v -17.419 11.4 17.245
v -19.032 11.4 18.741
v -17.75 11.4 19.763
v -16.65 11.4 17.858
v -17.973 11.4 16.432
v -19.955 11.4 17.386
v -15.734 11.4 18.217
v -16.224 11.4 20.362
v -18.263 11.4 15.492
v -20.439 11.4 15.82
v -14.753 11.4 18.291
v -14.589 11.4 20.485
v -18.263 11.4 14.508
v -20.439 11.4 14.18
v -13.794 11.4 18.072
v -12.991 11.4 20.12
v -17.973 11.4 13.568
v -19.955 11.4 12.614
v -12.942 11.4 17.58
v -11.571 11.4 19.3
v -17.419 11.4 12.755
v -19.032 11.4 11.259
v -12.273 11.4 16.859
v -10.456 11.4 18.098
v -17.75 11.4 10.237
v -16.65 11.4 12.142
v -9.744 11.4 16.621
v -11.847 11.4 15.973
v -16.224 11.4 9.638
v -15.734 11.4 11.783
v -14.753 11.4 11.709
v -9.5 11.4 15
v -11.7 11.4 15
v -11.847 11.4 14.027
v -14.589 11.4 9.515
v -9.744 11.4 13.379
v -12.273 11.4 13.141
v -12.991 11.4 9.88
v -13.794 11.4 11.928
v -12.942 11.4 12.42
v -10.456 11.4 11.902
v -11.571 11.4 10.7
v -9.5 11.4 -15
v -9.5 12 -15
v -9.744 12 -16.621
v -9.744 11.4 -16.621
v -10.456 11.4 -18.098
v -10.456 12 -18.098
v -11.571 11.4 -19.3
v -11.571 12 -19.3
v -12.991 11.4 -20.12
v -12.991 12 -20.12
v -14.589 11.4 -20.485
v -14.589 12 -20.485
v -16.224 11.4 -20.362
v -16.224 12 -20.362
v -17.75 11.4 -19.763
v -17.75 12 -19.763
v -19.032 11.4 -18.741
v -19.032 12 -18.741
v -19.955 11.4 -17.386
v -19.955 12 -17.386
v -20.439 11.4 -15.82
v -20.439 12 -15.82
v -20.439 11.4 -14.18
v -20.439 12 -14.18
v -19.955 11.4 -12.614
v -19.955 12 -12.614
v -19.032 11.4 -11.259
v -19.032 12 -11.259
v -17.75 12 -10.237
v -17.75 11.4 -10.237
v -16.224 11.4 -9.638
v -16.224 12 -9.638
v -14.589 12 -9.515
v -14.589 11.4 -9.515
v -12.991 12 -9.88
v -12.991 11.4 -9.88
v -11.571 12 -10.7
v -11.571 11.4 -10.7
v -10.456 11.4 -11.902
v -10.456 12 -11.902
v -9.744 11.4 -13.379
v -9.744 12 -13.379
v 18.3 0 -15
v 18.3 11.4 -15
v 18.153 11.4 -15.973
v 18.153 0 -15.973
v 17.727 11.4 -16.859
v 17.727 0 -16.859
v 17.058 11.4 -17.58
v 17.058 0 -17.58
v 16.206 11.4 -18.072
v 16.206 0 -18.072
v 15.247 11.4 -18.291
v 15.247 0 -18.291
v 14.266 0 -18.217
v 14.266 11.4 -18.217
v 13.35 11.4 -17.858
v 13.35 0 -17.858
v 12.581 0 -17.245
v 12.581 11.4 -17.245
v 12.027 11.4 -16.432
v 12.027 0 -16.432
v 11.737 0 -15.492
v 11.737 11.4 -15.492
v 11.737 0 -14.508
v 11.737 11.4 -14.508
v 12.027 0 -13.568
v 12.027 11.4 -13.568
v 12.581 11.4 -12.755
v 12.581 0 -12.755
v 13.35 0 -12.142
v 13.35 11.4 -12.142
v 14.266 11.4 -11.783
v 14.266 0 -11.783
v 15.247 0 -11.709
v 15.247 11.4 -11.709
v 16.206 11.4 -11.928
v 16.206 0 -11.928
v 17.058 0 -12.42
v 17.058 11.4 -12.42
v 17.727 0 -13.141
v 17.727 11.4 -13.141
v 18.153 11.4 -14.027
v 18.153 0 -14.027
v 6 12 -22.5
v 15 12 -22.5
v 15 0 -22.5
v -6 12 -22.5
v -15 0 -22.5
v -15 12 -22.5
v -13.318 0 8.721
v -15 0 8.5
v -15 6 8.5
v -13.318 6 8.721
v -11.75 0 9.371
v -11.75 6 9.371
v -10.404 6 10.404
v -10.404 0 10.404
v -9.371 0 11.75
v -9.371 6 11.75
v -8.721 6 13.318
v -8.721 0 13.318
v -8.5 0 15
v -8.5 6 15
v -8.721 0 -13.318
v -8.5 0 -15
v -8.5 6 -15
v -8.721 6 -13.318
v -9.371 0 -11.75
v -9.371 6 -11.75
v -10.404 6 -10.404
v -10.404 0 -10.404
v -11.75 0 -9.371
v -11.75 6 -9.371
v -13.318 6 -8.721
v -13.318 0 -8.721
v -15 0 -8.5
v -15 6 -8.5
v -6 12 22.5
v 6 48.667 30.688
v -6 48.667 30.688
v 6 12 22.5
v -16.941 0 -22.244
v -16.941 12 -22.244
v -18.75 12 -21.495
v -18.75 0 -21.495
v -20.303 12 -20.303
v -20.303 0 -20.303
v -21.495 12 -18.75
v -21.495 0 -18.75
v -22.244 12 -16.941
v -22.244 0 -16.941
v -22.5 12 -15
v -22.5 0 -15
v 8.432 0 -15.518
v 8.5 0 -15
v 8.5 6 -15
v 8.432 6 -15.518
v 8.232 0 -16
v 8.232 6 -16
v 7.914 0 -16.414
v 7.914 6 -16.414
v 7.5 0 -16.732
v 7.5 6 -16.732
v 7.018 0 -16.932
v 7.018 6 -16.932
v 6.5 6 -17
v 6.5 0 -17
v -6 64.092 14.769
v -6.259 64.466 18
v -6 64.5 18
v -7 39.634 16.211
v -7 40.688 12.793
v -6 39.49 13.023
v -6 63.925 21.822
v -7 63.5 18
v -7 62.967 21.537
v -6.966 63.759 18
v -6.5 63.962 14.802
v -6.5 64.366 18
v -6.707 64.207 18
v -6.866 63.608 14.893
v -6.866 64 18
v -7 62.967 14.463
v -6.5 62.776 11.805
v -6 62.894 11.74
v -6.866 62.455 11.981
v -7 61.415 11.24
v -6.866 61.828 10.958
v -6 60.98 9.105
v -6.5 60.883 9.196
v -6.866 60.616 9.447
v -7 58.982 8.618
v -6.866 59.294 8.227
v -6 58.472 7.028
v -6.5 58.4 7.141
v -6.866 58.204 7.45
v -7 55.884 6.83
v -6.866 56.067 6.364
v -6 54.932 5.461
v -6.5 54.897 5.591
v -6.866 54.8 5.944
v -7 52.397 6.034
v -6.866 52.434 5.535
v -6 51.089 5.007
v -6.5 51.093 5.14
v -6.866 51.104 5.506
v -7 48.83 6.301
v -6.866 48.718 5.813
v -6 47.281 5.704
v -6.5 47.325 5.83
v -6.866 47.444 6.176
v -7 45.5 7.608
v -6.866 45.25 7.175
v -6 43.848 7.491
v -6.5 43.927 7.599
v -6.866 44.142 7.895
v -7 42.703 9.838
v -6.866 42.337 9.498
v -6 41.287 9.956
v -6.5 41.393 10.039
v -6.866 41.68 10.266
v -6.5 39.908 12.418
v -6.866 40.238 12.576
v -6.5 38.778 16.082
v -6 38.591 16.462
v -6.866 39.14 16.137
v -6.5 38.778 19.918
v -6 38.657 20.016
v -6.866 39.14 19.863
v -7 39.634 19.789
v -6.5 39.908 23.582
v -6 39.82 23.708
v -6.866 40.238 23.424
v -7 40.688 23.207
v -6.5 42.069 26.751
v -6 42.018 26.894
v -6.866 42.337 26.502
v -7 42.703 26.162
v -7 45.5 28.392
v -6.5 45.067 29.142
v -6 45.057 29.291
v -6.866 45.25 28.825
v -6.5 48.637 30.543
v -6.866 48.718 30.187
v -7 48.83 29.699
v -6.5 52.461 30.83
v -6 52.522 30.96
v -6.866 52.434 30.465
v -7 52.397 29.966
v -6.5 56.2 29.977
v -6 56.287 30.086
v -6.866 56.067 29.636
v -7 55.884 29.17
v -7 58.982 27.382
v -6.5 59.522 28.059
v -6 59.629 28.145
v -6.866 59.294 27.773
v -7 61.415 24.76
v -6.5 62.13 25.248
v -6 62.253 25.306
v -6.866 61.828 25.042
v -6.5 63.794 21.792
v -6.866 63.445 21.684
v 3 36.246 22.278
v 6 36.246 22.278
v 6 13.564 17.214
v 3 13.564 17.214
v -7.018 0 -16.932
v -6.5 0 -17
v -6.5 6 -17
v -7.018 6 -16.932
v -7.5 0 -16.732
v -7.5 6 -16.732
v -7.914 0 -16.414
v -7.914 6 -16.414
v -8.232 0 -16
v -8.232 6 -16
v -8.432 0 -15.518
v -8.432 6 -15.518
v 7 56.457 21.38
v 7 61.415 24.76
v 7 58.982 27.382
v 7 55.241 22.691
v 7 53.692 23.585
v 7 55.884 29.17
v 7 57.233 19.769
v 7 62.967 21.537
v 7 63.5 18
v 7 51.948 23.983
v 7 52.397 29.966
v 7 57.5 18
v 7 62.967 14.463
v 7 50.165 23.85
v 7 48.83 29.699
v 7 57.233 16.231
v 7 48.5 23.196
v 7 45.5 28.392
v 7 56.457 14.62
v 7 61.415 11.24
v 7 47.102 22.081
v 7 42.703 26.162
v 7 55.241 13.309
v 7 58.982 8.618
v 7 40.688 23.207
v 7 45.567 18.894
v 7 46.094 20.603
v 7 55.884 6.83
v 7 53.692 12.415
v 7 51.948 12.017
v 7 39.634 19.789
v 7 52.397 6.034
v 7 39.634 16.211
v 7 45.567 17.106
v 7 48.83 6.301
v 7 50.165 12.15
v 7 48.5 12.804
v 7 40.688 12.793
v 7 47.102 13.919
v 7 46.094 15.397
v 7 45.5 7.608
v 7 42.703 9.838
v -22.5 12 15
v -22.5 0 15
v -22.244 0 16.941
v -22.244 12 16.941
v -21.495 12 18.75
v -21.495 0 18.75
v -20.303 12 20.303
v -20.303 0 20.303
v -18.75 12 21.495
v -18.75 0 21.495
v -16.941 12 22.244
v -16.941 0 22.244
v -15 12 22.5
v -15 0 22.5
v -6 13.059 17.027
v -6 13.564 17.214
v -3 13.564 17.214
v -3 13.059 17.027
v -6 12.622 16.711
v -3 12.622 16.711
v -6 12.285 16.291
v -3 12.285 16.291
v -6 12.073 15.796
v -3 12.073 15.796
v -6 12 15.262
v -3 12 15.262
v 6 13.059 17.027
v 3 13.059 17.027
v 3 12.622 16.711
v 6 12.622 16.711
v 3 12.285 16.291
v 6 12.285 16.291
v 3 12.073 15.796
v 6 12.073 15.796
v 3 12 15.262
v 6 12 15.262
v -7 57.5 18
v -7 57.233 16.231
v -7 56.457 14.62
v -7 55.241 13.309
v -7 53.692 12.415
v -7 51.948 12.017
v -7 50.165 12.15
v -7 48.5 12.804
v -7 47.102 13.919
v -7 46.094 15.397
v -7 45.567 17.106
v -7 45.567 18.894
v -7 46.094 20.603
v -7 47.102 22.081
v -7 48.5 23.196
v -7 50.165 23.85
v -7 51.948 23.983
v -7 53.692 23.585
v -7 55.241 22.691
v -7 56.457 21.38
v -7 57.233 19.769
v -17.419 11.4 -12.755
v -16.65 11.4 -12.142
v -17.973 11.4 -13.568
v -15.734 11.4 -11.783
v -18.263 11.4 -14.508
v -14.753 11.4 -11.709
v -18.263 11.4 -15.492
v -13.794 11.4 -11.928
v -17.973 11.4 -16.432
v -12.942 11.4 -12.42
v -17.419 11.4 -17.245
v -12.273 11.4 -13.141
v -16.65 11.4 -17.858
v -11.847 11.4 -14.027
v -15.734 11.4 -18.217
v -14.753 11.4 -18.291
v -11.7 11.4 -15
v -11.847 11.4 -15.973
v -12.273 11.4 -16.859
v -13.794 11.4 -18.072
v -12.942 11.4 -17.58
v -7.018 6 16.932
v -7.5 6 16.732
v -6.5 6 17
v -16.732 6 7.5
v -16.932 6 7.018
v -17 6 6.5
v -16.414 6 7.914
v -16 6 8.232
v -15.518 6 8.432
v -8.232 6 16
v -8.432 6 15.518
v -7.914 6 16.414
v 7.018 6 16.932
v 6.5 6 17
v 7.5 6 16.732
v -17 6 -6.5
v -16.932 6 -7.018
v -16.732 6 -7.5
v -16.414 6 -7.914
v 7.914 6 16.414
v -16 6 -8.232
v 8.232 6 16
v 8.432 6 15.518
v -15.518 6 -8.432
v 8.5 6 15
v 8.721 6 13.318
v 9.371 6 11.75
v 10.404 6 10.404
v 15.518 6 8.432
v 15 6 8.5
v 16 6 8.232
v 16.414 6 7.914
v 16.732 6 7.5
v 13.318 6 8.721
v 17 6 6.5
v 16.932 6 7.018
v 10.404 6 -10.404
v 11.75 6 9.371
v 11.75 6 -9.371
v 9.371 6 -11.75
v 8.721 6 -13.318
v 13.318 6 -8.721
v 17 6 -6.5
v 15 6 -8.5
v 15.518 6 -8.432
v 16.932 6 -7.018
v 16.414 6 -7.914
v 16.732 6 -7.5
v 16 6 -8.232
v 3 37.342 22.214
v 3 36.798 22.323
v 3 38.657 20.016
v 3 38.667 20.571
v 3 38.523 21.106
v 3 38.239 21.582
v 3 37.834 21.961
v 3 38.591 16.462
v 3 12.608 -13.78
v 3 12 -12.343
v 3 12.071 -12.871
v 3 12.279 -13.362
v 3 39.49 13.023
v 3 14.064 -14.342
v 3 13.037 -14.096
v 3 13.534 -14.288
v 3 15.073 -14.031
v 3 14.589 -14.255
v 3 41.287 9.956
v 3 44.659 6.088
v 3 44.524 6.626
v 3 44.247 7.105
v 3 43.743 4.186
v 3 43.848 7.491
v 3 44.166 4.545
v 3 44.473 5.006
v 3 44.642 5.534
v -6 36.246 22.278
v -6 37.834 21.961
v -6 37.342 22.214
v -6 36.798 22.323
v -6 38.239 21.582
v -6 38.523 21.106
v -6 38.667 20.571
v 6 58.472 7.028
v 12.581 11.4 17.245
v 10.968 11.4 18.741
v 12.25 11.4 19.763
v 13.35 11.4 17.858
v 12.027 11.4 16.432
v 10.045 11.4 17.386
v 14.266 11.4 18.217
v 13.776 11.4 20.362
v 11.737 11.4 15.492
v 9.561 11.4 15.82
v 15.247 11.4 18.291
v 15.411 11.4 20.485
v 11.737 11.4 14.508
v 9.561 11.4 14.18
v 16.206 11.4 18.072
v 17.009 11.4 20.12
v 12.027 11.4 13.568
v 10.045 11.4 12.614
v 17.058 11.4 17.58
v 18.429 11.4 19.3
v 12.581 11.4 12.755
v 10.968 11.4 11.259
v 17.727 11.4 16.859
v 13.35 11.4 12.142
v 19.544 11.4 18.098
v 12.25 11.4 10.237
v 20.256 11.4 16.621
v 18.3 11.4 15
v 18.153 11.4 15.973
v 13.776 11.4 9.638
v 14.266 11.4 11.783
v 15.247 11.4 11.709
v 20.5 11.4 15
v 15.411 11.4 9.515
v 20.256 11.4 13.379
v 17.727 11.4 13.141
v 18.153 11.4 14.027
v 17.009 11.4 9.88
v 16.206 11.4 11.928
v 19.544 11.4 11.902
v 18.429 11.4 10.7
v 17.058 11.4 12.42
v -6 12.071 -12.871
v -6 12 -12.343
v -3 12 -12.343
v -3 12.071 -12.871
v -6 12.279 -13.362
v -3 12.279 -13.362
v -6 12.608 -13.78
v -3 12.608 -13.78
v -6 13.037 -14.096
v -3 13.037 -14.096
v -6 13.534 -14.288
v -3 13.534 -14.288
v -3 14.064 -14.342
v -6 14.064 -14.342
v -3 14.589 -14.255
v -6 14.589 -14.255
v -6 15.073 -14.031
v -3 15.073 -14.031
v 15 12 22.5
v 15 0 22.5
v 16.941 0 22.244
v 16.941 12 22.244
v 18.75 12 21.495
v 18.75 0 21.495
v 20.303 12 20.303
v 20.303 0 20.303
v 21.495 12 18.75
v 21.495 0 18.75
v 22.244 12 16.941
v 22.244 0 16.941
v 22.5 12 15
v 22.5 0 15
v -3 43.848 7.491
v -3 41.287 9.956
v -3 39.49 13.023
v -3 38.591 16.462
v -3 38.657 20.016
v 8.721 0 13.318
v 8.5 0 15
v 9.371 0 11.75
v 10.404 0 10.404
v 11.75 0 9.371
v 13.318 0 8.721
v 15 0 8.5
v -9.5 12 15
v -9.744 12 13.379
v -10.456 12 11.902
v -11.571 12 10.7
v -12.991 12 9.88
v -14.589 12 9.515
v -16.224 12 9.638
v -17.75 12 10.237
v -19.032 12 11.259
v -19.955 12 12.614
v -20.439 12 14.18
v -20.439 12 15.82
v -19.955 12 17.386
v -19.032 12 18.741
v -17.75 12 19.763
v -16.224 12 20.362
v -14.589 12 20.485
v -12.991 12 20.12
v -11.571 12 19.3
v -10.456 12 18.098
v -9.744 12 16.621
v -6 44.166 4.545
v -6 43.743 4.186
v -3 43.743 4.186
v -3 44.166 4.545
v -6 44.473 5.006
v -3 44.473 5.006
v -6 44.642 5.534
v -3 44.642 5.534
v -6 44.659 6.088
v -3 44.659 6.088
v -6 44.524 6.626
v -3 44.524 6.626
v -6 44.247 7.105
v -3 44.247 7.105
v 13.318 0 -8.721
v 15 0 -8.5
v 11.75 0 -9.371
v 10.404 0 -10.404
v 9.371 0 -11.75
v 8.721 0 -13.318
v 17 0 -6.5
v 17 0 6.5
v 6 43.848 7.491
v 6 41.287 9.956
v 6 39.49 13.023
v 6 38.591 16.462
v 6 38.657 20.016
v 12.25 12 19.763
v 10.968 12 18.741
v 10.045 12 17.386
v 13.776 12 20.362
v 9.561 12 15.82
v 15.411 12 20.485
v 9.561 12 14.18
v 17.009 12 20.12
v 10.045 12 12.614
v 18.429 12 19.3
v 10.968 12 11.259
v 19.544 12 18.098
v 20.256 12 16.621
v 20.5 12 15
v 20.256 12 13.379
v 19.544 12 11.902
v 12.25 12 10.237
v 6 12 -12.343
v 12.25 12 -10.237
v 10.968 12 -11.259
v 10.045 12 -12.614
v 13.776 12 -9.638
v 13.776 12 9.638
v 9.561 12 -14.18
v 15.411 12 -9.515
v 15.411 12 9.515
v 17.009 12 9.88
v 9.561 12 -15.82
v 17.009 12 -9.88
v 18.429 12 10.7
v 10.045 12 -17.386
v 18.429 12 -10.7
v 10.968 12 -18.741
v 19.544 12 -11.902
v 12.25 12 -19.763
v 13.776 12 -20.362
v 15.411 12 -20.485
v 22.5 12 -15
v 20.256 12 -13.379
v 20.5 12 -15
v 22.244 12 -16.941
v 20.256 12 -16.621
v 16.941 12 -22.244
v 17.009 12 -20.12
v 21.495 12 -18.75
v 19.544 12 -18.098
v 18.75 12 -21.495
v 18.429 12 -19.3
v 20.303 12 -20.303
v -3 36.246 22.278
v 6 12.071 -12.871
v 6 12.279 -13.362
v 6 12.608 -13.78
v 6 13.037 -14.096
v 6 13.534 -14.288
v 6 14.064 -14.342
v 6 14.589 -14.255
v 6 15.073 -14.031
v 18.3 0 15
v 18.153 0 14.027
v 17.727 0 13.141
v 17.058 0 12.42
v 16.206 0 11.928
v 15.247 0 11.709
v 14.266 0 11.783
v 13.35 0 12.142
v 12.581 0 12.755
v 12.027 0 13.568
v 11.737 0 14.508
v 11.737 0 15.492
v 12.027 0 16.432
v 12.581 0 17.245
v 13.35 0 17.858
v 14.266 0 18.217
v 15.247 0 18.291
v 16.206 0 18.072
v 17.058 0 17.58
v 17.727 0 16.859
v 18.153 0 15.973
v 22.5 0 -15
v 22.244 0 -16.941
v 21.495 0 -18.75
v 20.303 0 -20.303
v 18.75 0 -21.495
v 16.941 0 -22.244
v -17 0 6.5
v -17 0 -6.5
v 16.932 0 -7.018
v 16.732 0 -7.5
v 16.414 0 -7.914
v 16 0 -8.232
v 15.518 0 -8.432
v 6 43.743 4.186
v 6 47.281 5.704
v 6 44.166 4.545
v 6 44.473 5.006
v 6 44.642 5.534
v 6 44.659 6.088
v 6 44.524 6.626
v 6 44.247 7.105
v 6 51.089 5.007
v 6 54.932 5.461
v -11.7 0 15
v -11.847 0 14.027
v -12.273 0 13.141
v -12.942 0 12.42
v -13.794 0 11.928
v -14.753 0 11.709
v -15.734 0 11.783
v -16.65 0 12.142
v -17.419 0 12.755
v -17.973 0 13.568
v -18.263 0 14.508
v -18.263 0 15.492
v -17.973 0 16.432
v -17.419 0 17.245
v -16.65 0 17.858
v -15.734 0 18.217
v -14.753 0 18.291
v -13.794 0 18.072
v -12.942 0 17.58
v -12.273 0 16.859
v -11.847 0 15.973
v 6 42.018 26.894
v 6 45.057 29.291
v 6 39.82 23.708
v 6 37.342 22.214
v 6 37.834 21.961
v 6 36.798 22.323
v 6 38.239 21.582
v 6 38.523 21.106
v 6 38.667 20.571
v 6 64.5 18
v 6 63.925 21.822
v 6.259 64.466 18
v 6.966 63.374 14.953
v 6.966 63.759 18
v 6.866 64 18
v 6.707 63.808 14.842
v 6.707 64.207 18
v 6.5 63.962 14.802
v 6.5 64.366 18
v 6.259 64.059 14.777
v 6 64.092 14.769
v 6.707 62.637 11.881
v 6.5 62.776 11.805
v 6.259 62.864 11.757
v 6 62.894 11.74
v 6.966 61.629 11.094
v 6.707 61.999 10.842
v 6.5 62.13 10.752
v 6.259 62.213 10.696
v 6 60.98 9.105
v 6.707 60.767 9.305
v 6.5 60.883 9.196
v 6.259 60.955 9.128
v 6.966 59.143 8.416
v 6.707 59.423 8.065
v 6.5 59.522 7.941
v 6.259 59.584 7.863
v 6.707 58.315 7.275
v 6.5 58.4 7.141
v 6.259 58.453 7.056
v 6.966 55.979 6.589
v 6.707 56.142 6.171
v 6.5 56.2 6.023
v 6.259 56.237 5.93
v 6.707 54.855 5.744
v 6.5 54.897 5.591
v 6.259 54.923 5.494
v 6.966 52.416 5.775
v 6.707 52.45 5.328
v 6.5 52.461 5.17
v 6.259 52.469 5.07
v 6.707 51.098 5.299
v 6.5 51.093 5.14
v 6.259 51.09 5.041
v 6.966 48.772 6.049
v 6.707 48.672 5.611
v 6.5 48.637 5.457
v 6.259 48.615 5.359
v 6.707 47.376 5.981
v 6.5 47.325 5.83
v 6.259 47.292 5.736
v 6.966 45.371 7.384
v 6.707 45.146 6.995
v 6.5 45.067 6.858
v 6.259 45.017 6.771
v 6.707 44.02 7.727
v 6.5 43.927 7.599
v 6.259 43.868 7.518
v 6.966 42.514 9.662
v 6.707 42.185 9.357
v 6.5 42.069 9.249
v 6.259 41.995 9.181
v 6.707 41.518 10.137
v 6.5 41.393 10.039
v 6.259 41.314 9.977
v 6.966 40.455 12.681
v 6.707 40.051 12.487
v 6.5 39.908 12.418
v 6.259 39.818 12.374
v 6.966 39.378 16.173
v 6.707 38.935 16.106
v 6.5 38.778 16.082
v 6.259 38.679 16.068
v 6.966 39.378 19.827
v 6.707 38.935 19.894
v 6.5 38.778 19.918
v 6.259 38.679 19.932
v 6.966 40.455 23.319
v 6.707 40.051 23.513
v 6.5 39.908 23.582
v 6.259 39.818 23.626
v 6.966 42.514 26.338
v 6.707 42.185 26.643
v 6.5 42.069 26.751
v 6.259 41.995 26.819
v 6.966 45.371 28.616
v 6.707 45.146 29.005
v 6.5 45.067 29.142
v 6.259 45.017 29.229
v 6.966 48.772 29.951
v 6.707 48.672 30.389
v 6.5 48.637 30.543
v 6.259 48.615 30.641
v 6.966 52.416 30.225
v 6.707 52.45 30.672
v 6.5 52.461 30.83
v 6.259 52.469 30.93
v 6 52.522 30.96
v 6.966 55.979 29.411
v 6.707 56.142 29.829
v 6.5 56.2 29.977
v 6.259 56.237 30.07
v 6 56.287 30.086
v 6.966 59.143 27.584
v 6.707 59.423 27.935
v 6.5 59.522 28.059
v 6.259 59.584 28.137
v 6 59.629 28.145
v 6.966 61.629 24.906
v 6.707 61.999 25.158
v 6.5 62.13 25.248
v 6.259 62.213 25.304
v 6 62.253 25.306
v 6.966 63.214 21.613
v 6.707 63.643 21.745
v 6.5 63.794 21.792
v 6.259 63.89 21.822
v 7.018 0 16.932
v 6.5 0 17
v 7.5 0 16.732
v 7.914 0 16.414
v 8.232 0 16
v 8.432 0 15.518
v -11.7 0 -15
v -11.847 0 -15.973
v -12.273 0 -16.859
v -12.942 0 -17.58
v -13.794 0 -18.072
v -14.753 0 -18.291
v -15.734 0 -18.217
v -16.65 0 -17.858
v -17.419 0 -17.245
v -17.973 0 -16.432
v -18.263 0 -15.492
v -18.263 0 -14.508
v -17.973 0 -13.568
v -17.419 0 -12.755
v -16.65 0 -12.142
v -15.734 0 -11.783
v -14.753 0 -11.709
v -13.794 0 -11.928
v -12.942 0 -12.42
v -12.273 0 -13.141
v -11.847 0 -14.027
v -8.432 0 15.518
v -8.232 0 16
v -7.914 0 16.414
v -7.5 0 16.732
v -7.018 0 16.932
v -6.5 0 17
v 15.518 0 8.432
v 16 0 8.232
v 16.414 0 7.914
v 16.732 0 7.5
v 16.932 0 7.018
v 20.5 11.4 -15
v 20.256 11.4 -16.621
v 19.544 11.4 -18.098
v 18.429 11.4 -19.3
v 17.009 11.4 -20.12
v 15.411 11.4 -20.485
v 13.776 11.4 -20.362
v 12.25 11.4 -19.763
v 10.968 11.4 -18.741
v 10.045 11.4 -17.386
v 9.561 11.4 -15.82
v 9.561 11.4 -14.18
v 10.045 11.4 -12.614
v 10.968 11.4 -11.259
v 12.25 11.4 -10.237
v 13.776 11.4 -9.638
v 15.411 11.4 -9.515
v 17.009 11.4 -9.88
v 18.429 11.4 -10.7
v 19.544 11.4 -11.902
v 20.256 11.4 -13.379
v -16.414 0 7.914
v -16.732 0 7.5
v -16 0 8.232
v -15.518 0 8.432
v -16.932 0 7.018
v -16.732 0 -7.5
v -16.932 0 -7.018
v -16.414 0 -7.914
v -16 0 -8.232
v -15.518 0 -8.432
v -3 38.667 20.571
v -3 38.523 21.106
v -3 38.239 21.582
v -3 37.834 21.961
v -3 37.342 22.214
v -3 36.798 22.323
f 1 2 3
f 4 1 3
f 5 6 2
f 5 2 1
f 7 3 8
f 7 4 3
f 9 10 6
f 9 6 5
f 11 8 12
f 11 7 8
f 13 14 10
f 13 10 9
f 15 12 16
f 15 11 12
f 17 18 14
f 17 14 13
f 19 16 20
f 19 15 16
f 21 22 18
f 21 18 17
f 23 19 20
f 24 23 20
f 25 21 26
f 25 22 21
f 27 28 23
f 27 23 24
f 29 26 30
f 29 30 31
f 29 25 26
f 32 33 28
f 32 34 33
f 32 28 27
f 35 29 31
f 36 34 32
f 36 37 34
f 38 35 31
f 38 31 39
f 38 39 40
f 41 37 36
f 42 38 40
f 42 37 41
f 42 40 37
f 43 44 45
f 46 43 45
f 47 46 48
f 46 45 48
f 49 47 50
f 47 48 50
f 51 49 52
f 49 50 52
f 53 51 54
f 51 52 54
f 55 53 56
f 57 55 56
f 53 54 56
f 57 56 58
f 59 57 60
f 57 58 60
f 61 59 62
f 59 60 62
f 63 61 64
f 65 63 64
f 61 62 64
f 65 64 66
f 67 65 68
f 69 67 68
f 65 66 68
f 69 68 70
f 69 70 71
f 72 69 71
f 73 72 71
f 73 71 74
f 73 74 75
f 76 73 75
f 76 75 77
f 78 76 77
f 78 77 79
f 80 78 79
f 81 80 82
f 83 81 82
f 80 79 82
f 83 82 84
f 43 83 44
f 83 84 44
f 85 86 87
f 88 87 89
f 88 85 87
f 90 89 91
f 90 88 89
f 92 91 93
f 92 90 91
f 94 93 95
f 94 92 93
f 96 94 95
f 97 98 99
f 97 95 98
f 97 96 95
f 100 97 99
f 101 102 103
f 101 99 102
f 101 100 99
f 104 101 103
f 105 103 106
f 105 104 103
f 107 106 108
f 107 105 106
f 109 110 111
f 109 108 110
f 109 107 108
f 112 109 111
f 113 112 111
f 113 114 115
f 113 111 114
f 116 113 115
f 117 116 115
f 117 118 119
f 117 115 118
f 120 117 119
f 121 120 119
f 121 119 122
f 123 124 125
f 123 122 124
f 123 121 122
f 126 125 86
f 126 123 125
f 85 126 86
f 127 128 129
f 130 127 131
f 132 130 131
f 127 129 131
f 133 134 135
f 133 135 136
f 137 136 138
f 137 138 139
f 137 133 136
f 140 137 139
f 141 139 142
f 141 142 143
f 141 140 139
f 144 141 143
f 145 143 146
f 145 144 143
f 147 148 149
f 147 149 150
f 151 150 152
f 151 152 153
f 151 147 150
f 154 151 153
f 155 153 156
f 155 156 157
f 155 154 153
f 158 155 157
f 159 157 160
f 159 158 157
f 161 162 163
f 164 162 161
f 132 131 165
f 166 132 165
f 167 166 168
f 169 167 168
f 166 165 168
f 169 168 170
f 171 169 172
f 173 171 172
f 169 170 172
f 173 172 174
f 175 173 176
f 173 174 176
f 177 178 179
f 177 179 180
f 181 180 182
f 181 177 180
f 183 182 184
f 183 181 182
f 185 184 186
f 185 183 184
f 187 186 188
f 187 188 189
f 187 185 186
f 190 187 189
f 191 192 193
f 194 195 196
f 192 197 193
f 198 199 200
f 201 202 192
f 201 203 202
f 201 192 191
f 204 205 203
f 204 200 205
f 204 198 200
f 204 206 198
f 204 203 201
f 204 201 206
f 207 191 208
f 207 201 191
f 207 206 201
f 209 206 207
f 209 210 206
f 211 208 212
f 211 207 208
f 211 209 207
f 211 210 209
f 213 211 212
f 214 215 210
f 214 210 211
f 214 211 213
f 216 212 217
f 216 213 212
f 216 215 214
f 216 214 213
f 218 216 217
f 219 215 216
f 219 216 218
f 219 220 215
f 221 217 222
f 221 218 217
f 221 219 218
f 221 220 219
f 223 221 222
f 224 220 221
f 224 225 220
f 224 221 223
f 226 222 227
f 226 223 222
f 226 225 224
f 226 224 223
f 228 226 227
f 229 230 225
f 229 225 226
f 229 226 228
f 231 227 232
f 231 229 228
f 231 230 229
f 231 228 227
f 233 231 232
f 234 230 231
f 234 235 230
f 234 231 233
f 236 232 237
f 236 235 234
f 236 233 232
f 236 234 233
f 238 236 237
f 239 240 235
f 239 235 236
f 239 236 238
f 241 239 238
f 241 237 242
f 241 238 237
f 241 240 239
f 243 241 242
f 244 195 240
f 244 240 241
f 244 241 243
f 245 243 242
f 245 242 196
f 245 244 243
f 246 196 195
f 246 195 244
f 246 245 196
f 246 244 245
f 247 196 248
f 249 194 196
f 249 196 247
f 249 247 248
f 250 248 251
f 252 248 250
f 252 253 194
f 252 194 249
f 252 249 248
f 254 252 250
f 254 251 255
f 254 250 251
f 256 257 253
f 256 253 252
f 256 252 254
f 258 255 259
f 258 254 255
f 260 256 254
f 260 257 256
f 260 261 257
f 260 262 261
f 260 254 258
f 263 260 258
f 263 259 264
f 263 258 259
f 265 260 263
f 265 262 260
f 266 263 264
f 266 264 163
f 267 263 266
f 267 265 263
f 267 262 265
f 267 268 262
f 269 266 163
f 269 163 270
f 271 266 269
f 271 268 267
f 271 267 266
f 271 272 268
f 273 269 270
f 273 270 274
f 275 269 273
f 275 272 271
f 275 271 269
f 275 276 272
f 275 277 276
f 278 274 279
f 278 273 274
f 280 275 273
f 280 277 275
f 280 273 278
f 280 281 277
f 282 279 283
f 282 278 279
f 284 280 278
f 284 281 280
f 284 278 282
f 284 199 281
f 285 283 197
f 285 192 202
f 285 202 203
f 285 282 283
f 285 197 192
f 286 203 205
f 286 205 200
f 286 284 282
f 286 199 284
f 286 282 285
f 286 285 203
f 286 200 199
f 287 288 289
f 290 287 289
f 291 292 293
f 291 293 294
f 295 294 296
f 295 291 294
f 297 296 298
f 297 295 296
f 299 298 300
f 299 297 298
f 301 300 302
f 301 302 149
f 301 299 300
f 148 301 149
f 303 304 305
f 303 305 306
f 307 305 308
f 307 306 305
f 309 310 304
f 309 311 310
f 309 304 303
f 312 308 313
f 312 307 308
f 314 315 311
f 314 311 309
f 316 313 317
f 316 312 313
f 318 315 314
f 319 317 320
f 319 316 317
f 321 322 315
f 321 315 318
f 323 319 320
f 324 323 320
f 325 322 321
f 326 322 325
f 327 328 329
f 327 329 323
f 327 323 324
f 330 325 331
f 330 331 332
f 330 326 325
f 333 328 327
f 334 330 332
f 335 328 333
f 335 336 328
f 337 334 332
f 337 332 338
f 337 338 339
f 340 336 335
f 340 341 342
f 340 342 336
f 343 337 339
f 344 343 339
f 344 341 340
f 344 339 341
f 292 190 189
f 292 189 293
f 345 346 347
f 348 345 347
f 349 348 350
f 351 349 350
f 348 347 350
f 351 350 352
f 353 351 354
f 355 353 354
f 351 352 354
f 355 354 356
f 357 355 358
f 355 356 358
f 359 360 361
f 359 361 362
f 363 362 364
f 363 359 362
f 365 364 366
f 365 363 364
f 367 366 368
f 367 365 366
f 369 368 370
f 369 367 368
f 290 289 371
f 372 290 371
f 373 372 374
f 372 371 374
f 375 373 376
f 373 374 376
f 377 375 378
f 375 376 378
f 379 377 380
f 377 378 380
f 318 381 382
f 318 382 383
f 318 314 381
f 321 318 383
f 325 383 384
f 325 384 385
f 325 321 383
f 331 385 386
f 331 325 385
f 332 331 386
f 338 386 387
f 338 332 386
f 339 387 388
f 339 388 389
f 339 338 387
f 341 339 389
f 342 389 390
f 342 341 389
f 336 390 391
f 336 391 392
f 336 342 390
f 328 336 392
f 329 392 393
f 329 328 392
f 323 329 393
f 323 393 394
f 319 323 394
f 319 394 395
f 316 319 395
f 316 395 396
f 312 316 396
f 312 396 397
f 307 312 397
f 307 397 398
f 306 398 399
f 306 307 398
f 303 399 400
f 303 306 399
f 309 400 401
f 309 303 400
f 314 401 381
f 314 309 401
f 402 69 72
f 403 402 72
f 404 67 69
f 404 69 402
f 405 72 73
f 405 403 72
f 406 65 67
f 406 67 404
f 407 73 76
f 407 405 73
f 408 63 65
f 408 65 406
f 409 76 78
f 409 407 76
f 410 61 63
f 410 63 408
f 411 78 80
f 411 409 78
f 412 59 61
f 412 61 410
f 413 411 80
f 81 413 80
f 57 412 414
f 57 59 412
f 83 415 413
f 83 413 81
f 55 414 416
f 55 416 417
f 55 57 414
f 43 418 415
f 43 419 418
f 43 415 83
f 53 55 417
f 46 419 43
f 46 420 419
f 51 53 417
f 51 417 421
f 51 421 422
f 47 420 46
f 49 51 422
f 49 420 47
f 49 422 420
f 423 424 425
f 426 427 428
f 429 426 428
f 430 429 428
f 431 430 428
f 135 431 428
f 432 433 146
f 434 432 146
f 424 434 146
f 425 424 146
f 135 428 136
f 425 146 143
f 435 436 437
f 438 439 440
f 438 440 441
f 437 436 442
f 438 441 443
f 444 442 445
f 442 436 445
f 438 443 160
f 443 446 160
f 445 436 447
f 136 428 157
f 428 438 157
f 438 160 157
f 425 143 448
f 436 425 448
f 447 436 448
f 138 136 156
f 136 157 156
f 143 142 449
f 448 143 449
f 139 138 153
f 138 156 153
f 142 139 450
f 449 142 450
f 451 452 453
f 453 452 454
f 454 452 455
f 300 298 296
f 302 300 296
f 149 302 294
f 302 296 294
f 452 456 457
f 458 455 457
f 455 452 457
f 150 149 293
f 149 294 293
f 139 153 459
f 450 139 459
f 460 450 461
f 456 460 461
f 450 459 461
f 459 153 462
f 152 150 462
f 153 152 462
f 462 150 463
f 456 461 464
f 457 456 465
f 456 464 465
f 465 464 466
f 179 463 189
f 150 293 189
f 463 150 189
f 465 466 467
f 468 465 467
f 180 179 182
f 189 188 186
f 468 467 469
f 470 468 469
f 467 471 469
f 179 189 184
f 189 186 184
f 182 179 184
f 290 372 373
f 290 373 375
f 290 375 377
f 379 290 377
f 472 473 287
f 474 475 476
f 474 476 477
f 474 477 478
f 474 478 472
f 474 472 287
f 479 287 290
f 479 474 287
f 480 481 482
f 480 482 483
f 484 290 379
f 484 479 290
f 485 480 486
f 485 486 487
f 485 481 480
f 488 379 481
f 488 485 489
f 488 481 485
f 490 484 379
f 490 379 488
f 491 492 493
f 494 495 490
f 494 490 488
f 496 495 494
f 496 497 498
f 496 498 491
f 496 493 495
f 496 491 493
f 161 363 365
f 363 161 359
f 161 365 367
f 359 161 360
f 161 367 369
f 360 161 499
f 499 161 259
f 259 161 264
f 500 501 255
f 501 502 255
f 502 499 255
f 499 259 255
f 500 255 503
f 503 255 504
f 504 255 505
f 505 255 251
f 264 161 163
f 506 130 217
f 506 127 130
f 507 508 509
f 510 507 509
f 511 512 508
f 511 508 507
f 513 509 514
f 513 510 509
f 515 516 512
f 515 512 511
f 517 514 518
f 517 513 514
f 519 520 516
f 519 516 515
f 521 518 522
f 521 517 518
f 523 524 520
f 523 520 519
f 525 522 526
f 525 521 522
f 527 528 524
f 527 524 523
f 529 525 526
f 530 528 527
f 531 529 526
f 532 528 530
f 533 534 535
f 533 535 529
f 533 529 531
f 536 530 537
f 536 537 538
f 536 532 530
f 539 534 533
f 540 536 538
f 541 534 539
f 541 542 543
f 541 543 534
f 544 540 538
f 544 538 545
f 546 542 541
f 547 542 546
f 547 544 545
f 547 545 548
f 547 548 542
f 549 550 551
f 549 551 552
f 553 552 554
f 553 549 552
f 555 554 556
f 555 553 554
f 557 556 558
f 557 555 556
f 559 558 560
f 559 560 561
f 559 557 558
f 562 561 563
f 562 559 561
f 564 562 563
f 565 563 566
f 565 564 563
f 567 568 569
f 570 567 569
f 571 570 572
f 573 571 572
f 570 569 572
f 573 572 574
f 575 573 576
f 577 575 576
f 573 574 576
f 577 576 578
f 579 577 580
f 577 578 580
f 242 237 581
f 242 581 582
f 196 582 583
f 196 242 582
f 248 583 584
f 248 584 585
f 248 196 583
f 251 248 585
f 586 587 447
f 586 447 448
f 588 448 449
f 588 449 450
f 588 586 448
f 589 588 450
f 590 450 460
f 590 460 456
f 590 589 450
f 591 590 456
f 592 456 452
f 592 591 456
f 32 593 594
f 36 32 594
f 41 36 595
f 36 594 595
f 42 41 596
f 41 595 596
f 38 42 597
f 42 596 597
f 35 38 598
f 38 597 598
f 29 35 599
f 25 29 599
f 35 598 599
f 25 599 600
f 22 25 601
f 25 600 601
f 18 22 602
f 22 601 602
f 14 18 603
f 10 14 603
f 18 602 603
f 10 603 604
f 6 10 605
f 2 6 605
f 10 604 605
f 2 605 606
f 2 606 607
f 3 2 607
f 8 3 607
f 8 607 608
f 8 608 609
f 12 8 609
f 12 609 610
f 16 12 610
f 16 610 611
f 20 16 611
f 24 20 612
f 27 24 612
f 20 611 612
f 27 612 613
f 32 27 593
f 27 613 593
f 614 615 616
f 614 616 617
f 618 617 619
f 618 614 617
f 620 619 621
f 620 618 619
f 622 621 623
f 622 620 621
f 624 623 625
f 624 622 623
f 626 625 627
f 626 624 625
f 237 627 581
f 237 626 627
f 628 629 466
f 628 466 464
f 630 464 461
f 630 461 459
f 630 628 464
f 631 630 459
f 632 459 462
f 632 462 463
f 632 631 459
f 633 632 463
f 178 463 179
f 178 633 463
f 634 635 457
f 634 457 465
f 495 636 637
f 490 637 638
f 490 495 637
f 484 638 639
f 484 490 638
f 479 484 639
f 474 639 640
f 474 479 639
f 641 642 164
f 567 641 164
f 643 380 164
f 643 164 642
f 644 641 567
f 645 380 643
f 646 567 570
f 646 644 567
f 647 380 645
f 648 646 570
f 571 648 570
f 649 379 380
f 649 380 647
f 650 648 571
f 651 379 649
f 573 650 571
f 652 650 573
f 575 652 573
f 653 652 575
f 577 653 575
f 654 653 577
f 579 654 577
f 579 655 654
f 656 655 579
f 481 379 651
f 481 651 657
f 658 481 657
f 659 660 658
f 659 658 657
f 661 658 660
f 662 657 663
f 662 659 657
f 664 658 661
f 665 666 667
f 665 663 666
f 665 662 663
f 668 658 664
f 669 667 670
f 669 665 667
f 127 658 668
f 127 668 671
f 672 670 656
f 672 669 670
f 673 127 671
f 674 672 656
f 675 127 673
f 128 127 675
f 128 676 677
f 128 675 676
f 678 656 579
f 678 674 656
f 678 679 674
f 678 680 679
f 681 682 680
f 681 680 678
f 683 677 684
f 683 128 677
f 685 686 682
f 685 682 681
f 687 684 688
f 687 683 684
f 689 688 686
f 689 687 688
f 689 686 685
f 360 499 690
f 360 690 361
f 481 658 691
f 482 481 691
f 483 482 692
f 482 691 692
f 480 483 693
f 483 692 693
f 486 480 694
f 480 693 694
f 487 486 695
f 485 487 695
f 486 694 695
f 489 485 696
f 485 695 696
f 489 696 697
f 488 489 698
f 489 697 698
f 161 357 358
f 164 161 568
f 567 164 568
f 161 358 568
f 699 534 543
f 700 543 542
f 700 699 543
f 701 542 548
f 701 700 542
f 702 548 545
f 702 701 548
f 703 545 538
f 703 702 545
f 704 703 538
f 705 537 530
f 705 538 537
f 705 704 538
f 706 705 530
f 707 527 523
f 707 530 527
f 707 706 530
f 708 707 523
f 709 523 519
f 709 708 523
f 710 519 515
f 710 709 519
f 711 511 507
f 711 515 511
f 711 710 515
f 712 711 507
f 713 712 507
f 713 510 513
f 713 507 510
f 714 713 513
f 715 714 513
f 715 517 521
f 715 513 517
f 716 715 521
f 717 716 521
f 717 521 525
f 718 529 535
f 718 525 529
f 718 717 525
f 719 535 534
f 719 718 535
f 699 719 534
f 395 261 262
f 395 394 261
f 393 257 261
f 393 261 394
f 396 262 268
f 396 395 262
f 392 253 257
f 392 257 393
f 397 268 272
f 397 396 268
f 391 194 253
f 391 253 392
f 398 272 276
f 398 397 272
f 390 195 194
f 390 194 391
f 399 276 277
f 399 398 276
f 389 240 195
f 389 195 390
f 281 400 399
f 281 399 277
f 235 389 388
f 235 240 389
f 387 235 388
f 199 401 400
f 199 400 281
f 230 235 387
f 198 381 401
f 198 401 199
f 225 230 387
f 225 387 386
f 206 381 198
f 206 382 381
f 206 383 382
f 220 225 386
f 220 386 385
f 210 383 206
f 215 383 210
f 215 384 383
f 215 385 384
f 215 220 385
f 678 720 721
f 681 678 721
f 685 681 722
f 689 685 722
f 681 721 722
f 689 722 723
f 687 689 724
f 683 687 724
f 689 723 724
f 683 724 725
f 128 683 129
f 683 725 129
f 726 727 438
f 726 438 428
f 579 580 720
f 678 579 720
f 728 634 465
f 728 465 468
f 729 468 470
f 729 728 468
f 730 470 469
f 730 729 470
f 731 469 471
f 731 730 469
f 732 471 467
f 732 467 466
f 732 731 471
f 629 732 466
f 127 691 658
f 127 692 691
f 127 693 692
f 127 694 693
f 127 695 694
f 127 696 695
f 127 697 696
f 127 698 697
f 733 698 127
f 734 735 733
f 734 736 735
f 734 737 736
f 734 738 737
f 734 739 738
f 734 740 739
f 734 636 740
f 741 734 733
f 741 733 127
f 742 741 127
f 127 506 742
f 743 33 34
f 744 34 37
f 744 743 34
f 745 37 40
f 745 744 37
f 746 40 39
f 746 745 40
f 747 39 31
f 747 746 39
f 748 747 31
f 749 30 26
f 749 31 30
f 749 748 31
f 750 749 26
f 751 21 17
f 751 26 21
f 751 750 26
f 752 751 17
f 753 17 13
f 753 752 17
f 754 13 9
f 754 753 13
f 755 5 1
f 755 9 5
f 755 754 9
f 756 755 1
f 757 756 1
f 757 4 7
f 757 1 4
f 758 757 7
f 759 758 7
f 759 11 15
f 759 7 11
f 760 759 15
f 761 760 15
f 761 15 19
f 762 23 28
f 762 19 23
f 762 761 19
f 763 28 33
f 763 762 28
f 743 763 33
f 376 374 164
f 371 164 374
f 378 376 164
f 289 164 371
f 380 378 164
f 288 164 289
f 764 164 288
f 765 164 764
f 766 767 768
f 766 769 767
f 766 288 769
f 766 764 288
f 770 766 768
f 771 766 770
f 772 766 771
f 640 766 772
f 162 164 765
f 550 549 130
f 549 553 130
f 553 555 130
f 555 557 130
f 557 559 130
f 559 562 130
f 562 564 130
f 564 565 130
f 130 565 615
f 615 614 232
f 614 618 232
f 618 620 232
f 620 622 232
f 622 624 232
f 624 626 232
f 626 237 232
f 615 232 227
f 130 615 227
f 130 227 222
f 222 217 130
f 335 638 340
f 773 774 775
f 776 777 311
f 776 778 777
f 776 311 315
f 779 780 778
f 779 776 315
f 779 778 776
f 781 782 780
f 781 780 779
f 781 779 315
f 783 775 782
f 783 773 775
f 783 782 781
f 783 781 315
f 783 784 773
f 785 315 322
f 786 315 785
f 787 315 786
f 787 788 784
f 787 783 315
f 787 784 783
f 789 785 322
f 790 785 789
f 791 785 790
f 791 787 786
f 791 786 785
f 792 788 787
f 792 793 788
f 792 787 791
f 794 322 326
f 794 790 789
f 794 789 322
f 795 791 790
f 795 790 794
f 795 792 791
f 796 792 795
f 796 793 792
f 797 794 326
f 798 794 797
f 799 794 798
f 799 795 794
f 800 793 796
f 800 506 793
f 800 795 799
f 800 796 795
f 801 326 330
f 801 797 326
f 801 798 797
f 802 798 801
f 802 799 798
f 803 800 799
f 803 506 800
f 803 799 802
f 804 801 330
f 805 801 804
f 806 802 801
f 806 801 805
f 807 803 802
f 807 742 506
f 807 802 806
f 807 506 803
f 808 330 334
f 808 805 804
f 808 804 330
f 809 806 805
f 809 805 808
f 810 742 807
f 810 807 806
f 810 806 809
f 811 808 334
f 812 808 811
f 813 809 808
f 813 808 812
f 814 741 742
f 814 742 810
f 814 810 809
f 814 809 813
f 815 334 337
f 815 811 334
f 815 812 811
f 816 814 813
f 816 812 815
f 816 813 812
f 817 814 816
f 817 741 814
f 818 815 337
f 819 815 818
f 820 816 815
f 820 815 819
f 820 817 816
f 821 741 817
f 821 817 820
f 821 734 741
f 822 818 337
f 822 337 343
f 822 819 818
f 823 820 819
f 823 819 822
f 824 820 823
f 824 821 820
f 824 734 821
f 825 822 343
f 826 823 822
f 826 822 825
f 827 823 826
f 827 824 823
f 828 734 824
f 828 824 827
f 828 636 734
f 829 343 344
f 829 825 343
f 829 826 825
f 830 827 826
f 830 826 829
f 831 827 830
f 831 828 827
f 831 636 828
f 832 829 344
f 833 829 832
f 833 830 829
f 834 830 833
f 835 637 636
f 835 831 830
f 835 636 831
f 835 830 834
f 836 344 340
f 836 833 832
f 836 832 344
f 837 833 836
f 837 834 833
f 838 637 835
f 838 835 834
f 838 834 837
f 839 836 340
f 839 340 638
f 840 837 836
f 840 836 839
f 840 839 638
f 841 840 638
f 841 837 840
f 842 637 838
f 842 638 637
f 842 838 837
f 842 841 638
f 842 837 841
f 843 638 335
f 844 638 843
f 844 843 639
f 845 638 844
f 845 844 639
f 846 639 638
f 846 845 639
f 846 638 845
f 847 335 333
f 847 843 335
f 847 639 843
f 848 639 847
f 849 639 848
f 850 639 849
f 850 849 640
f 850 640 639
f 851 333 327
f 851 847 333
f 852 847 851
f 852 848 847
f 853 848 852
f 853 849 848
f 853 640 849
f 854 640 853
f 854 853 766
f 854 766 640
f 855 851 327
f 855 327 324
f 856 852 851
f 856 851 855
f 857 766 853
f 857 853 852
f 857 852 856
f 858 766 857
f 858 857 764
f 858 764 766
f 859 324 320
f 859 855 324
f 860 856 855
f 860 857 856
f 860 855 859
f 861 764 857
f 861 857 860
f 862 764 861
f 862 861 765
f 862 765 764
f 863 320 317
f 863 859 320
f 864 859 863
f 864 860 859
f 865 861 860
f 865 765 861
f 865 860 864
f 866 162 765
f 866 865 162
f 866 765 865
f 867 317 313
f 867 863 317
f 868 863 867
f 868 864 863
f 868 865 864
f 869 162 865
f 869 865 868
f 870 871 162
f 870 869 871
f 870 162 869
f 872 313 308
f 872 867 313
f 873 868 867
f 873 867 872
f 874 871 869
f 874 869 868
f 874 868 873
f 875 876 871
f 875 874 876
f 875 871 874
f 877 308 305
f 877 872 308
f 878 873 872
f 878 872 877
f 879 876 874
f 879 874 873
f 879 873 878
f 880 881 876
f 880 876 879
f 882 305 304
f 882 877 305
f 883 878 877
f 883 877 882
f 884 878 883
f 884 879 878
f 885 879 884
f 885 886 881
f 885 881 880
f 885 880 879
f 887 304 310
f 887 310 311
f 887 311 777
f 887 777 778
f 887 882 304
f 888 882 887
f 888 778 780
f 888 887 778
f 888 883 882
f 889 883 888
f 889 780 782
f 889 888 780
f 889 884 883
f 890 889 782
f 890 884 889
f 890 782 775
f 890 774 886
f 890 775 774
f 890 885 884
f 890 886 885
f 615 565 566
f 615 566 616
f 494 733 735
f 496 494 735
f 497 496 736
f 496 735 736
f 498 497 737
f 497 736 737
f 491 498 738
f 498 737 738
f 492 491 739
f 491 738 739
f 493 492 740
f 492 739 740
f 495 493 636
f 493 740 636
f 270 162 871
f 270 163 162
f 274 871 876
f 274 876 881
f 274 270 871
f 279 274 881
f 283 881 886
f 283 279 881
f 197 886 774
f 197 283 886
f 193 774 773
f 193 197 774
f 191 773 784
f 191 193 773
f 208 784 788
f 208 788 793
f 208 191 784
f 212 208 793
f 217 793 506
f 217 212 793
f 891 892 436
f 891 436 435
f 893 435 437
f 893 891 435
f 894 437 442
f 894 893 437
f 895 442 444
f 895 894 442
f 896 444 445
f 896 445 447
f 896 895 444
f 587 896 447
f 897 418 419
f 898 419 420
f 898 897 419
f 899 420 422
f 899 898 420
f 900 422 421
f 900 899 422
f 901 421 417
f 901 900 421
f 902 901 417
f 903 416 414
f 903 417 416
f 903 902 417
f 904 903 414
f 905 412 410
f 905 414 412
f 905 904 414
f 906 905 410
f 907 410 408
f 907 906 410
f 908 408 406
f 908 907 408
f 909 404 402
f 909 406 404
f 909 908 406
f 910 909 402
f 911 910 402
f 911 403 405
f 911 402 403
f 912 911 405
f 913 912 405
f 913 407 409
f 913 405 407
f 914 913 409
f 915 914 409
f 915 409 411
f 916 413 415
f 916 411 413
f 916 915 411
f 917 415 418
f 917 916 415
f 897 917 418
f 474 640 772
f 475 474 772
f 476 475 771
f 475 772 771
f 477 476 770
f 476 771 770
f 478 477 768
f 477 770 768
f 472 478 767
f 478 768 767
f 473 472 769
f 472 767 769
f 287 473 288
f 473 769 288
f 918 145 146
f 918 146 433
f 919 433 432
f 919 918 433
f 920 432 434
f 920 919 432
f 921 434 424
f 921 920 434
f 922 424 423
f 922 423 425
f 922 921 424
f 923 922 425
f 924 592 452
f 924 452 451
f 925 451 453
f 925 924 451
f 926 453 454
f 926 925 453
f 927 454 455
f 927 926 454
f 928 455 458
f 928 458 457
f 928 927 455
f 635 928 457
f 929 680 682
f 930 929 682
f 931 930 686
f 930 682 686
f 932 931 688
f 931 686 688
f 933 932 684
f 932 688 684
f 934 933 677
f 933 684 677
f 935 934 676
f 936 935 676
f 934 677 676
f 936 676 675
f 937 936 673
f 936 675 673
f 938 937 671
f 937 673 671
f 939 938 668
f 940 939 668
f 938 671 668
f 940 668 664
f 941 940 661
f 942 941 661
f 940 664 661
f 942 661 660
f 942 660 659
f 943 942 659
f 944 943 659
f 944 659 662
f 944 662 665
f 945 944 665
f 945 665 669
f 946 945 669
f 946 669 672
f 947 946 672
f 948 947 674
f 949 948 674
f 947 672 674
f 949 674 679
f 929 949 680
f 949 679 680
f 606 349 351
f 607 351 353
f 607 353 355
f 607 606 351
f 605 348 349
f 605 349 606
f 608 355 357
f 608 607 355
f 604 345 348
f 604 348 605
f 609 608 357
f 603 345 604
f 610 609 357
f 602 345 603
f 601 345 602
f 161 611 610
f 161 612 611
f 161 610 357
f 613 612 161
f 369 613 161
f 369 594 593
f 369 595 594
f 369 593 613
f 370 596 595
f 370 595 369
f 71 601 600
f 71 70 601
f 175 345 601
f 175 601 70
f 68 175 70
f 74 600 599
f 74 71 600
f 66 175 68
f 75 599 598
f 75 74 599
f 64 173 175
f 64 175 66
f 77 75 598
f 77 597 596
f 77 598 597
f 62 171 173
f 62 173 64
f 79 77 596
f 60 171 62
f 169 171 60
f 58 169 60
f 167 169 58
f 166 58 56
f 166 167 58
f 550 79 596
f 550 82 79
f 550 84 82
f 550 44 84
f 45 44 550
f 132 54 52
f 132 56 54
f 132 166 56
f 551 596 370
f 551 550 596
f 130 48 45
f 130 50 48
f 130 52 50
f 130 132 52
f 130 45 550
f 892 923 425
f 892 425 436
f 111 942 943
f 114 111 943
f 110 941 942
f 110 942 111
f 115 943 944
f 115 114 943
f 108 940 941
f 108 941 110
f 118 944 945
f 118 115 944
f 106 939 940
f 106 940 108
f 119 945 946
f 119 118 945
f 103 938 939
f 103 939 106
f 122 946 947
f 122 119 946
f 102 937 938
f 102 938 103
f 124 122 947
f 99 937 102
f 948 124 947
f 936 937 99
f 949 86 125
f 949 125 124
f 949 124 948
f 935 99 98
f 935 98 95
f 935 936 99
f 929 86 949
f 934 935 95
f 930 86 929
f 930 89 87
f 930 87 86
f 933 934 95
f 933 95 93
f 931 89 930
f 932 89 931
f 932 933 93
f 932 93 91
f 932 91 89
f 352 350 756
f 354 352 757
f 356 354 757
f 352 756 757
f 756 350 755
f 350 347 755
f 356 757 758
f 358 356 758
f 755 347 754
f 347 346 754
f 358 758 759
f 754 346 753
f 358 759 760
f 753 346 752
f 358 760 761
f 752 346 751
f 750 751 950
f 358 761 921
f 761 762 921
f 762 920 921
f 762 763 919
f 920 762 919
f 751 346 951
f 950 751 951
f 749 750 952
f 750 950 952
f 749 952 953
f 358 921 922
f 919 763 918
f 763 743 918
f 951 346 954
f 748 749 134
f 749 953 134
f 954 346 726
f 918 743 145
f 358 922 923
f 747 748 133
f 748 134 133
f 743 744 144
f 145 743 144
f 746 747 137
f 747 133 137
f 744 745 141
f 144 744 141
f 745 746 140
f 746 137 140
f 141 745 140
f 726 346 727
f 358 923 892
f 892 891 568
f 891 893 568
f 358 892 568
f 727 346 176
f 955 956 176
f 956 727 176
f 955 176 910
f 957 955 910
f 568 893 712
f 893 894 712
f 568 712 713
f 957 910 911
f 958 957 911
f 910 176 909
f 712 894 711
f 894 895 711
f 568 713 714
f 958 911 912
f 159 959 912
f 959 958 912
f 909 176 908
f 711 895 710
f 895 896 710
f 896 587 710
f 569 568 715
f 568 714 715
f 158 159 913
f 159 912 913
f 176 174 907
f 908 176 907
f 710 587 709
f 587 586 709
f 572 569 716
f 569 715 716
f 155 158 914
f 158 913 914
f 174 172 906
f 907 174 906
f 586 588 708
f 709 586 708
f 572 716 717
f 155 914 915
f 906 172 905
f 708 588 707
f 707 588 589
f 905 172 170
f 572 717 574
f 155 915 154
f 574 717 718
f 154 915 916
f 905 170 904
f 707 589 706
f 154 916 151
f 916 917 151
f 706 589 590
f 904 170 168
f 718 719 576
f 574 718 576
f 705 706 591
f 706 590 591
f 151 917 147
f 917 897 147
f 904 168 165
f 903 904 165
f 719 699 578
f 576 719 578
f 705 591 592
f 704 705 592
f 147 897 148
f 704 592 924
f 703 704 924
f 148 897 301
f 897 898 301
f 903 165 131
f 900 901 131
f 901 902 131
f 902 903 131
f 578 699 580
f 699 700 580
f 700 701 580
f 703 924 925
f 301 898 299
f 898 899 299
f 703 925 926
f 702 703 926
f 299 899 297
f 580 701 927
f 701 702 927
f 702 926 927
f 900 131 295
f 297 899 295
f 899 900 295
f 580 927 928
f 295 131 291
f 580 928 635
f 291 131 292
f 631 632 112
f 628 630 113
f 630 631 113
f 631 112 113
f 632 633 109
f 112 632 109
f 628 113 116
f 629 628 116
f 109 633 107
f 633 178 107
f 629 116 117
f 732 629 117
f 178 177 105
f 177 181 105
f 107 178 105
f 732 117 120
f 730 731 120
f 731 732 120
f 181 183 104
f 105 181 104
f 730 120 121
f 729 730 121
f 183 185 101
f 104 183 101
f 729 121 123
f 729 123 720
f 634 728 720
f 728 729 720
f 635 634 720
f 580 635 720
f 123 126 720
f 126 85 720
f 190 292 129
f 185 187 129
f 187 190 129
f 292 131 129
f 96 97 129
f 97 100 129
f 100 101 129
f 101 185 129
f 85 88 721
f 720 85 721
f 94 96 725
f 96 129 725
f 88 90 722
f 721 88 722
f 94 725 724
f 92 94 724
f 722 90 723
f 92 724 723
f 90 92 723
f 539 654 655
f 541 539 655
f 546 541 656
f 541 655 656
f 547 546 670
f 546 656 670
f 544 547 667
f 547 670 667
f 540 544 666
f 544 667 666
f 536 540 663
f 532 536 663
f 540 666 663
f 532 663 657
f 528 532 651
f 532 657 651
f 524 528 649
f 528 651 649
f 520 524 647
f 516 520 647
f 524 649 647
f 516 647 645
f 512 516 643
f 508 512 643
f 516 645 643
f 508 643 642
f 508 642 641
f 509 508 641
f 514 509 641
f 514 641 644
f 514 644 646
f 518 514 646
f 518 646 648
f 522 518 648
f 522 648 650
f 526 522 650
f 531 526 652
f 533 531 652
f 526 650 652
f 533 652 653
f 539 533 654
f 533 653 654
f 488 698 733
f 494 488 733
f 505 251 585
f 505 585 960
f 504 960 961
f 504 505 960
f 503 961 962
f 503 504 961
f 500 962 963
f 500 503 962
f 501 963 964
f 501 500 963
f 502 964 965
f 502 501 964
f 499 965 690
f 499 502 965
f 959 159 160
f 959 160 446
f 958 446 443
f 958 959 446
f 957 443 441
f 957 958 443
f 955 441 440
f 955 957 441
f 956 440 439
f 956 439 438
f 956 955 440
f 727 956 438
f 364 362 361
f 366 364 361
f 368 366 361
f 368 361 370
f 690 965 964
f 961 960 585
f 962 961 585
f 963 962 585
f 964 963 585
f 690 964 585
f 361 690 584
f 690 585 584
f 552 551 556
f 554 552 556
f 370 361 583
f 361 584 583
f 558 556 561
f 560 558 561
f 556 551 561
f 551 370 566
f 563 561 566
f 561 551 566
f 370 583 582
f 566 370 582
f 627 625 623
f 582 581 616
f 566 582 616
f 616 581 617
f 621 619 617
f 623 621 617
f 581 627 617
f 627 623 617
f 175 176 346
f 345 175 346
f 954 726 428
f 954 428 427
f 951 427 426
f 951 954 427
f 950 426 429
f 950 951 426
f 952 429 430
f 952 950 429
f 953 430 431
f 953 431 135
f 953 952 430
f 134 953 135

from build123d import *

# Parameters (mm, degrees)
SKETCH1_R                = 3.3
BOSS_EXTRUDE1_DEPTH      = 12
BOSS_EXTRUDE2_DEPTH      = 6
BOSS_EXTRUDE2_DEPTH_BACK = 6
CUT_EXTRUDE1_DEPTH       = 3
CUT_EXTRUDE2_DEPTH       = 3
CUT_EXTRUDE3_DEPTH       = 6
SKETCH7_R                = 5.5
CUT_EXTRUDE4_DEPTH       = 0.6
SKETCH8_R                = 5.5
CUT_EXTRUDE5_DEPTH       = 0.6
SKETCH9_R                = 5.5
CUT_EXTRUDE6_DEPTH       = 0.6
SKETCH10_R               = 5.5
CUT_EXTRUDE7_DEPTH       = 0.6


with BuildPart() as part:
    # Sketch1 → Boss-Extrude1 (new body)
    with BuildSketch(Plane(origin=(0, 0, 0), x_dir=(1, 0, 0), z_dir=(0, 1, 0))):
        with BuildLine():
            Line((-15, -22.5), (15, -22.5))
            ThreePointArc((15, -22.5), (20.303300859, -20.303300859), (22.5, -15))
            Line((22.5, -15), (22.5, 15))
            ThreePointArc((22.5, 15), (20.303300859, 20.303300859), (15, 22.5))
            Line((15, 22.5), (-15, 22.5))
            ThreePointArc((-15, 22.5), (-20.303300859, 20.303300859), (-22.5, 15))
            Line((-22.5, 15), (-22.5, -15))
            ThreePointArc((-22.5, -15), (-20.303300859, -20.303300859), (-15, -22.5))
        make_face()
        with Locations((15, 15)):
            Circle(SKETCH1_R, mode=Mode.SUBTRACT)
        with Locations((15, -15)):
            Circle(SKETCH1_R, mode=Mode.SUBTRACT)
        with Locations((-15, 15)):
            Circle(SKETCH1_R, mode=Mode.SUBTRACT)
        with Locations((-15, -15)):
            Circle(SKETCH1_R, mode=Mode.SUBTRACT)
    extrude(amount=BOSS_EXTRUDE1_DEPTH)

    # Sketch2 → Boss-Extrude2 (add, two sides)
    with BuildSketch(Plane(origin=(0, 0, 0), x_dir=(0, 0, -1), z_dir=(1, 0, 0))) as boss_extrude2_sk:
        with BuildLine():
            Line((-30.687542875, 48.666935264), (-22.5, 12))
            Line((-22.5, 12), (22.5, 12))
            Line((22.5, 12), (-7.027549789, 58.471752748))
            ThreePointArc((-7.027549789, 58.471752748), (-13.023153892, 39.49037874), (-30.687542875, 48.666935264))
        make_face()
    extrude(amount=BOSS_EXTRUDE2_DEPTH)
    extrude(boss_extrude2_sk.sketch, amount=-BOSS_EXTRUDE2_DEPTH_BACK)

    # Sketch3 → Cut-Extrude1 (cut)
    with BuildSketch(Plane(origin=(6, 0, 0), x_dir=(0, 0, -1), z_dir=(1, 0, 0))):
        with BuildLine():
            Line((-22.278487974, 36.245671412), (-17.213816554, 13.564143887))
            ThreePointArc((-17.213816554, 13.564143887), (-16.512544263, 12.439277054), (-15.261886881, 12))
            Line((-15.261886881, 12), (12.343334592, 12))
            ThreePointArc((12.343334592, 12), (14.096211469, 13.036972143), (14.031403855, 15.072577346))
            Line((14.031403855, 15.072577346), (-4.185678595, 43.743420591))
            ThreePointArc((-4.185678595, 43.743420591), (-5.810453328, 44.669841445), (-7.490581477, 43.848064146))
            ThreePointArc((-7.490581477, 43.848064146), (-13.023153892, 39.49037874), (-20.016350528, 38.657323856))
            ThreePointArc((-20.016350528, 38.657323856), (-21.785266488, 38.049800314), (-22.278487974, 36.245671412))
        make_face()
    extrude(amount=-CUT_EXTRUDE1_DEPTH, mode=Mode.SUBTRACT)

    # Sketch4 → Cut-Extrude2 (cut)
    with BuildSketch(Plane(origin=(-6, 0, 0), x_dir=(0, 0, -1), z_dir=(1, 0, 0))):
        with BuildLine():
            Line((-22.278487974, 36.245671412), (-17.213816554, 13.564143887))
            ThreePointArc((-17.213816554, 13.564143887), (-16.512544263, 12.439277054), (-15.261886881, 12))
            Line((-15.261886881, 12), (12.343334592, 12))
            ThreePointArc((12.343334592, 12), (14.096211469, 13.036972143), (14.031403855, 15.072577346))
            Line((14.031403855, 15.072577346), (-4.185678595, 43.743420591))
            ThreePointArc((-4.185678595, 43.743420591), (-5.810453328, 44.669841445), (-7.490581477, 43.848064146))
            ThreePointArc((-7.490581477, 43.848064146), (-13.023153892, 39.49037874), (-20.016350528, 38.657323856))
            ThreePointArc((-20.016350528, 38.657323856), (-21.785266488, 38.049800314), (-22.278487974, 36.245671412))
        make_face()
    extrude(amount=CUT_EXTRUDE2_DEPTH, mode=Mode.SUBTRACT)

    # Sketch5 → Revolve1 (revolve)
    with BuildSketch(Plane.XY.offset(18)):
        with BuildLine():
            Line((-7, 63.5), (-7, 57.5))
            Line((-7, 57.5), (7, 57.5))
            Line((7, 57.5), (7, 63.5))
            ThreePointArc((7, 63.5), (6.707106781, 64.207106781), (6, 64.5))
            Line((6, 64.5), (-6, 64.5))
            ThreePointArc((-6, 64.5), (-6.707106781, 64.207106781), (-7, 63.5))
        make_face()
    revolve(axis=Axis((7, 51.5, 18), (-1, 0, 0)))

    # Sketch6 → Cut-Extrude3 (cut)
    with BuildSketch(Plane(origin=(0, 0, 0), x_dir=(1, 0, 0), z_dir=(0, 1, 0))):
        with BuildLine():
            Line((-17, 6.5), (-17, -6.5))
            ThreePointArc((-17, -6.5), (-16.414213562, -7.914213562), (-15, -8.5))
            ThreePointArc((-15, -8.5), (-10.403805922, -10.403805922), (-8.5, -15))
            ThreePointArc((-8.5, -15), (-7.914213562, -16.414213562), (-6.5, -17))
            Line((-6.5, -17), (6.5, -17))
            ThreePointArc((6.5, -17), (7.914213562, -16.414213562), (8.5, -15))
            ThreePointArc((8.5, -15), (10.403805922, -10.403805922), (15, -8.5))
            ThreePointArc((15, -8.5), (16.414213562, -7.914213562), (17, -6.5))
            Line((17, -6.5), (17, 6.5))
            ThreePointArc((17, 6.5), (16.414213562, 7.914213562), (15, 8.5))
            ThreePointArc((15, 8.5), (10.403805922, 10.403805922), (8.5, 15))
            ThreePointArc((8.5, 15), (7.914213562, 16.414213562), (6.5, 17))
            Line((6.5, 17), (-6.5, 17))
            ThreePointArc((-6.5, 17), (-7.914213562, 16.414213562), (-8.5, 15))
            ThreePointArc((-8.5, 15), (-10.403805922, 10.403805922), (-15, 8.5))
            ThreePointArc((-15, 8.5), (-16.414213562, 7.914213562), (-17, 6.5))
        make_face()
    extrude(amount=CUT_EXTRUDE3_DEPTH, mode=Mode.SUBTRACT)

    # Sketch7 → Cut-Extrude4 (cut)
    with BuildSketch(Plane(origin=(0, 12, 0), x_dir=(1, 0, 0), z_dir=(0, 1, 0))):
        with Locations((15, 15)):
            Circle(SKETCH7_R)
    extrude(amount=-CUT_EXTRUDE4_DEPTH, mode=Mode.SUBTRACT)

    # Sketch8 → Cut-Extrude5 (cut)
    with BuildSketch(Plane(origin=(0, 12, 0), x_dir=(1, 0, 0), z_dir=(0, 1, 0))):
        with Locations((-15, 15)):
            Circle(SKETCH8_R)
    extrude(amount=-CUT_EXTRUDE5_DEPTH, mode=Mode.SUBTRACT)

    # Sketch9 → Cut-Extrude6 (cut)
    with BuildSketch(Plane(origin=(0, 12, 0), x_dir=(1, 0, 0), z_dir=(0, 1, 0))):
        with Locations((15, -15)):
            Circle(SKETCH9_R)
    extrude(amount=-CUT_EXTRUDE6_DEPTH, mode=Mode.SUBTRACT)

    # Sketch10 → Cut-Extrude7 (cut)
    with BuildSketch(Plane(origin=(0, 12, 0), x_dir=(1, 0, 0), z_dir=(0, 1, 0))):
        with Locations((-15, -15)):
            Circle(SKETCH10_R)
    extrude(amount=-CUT_EXTRUDE7_DEPTH, mode=Mode.SUBTRACT)


solid = part.part
